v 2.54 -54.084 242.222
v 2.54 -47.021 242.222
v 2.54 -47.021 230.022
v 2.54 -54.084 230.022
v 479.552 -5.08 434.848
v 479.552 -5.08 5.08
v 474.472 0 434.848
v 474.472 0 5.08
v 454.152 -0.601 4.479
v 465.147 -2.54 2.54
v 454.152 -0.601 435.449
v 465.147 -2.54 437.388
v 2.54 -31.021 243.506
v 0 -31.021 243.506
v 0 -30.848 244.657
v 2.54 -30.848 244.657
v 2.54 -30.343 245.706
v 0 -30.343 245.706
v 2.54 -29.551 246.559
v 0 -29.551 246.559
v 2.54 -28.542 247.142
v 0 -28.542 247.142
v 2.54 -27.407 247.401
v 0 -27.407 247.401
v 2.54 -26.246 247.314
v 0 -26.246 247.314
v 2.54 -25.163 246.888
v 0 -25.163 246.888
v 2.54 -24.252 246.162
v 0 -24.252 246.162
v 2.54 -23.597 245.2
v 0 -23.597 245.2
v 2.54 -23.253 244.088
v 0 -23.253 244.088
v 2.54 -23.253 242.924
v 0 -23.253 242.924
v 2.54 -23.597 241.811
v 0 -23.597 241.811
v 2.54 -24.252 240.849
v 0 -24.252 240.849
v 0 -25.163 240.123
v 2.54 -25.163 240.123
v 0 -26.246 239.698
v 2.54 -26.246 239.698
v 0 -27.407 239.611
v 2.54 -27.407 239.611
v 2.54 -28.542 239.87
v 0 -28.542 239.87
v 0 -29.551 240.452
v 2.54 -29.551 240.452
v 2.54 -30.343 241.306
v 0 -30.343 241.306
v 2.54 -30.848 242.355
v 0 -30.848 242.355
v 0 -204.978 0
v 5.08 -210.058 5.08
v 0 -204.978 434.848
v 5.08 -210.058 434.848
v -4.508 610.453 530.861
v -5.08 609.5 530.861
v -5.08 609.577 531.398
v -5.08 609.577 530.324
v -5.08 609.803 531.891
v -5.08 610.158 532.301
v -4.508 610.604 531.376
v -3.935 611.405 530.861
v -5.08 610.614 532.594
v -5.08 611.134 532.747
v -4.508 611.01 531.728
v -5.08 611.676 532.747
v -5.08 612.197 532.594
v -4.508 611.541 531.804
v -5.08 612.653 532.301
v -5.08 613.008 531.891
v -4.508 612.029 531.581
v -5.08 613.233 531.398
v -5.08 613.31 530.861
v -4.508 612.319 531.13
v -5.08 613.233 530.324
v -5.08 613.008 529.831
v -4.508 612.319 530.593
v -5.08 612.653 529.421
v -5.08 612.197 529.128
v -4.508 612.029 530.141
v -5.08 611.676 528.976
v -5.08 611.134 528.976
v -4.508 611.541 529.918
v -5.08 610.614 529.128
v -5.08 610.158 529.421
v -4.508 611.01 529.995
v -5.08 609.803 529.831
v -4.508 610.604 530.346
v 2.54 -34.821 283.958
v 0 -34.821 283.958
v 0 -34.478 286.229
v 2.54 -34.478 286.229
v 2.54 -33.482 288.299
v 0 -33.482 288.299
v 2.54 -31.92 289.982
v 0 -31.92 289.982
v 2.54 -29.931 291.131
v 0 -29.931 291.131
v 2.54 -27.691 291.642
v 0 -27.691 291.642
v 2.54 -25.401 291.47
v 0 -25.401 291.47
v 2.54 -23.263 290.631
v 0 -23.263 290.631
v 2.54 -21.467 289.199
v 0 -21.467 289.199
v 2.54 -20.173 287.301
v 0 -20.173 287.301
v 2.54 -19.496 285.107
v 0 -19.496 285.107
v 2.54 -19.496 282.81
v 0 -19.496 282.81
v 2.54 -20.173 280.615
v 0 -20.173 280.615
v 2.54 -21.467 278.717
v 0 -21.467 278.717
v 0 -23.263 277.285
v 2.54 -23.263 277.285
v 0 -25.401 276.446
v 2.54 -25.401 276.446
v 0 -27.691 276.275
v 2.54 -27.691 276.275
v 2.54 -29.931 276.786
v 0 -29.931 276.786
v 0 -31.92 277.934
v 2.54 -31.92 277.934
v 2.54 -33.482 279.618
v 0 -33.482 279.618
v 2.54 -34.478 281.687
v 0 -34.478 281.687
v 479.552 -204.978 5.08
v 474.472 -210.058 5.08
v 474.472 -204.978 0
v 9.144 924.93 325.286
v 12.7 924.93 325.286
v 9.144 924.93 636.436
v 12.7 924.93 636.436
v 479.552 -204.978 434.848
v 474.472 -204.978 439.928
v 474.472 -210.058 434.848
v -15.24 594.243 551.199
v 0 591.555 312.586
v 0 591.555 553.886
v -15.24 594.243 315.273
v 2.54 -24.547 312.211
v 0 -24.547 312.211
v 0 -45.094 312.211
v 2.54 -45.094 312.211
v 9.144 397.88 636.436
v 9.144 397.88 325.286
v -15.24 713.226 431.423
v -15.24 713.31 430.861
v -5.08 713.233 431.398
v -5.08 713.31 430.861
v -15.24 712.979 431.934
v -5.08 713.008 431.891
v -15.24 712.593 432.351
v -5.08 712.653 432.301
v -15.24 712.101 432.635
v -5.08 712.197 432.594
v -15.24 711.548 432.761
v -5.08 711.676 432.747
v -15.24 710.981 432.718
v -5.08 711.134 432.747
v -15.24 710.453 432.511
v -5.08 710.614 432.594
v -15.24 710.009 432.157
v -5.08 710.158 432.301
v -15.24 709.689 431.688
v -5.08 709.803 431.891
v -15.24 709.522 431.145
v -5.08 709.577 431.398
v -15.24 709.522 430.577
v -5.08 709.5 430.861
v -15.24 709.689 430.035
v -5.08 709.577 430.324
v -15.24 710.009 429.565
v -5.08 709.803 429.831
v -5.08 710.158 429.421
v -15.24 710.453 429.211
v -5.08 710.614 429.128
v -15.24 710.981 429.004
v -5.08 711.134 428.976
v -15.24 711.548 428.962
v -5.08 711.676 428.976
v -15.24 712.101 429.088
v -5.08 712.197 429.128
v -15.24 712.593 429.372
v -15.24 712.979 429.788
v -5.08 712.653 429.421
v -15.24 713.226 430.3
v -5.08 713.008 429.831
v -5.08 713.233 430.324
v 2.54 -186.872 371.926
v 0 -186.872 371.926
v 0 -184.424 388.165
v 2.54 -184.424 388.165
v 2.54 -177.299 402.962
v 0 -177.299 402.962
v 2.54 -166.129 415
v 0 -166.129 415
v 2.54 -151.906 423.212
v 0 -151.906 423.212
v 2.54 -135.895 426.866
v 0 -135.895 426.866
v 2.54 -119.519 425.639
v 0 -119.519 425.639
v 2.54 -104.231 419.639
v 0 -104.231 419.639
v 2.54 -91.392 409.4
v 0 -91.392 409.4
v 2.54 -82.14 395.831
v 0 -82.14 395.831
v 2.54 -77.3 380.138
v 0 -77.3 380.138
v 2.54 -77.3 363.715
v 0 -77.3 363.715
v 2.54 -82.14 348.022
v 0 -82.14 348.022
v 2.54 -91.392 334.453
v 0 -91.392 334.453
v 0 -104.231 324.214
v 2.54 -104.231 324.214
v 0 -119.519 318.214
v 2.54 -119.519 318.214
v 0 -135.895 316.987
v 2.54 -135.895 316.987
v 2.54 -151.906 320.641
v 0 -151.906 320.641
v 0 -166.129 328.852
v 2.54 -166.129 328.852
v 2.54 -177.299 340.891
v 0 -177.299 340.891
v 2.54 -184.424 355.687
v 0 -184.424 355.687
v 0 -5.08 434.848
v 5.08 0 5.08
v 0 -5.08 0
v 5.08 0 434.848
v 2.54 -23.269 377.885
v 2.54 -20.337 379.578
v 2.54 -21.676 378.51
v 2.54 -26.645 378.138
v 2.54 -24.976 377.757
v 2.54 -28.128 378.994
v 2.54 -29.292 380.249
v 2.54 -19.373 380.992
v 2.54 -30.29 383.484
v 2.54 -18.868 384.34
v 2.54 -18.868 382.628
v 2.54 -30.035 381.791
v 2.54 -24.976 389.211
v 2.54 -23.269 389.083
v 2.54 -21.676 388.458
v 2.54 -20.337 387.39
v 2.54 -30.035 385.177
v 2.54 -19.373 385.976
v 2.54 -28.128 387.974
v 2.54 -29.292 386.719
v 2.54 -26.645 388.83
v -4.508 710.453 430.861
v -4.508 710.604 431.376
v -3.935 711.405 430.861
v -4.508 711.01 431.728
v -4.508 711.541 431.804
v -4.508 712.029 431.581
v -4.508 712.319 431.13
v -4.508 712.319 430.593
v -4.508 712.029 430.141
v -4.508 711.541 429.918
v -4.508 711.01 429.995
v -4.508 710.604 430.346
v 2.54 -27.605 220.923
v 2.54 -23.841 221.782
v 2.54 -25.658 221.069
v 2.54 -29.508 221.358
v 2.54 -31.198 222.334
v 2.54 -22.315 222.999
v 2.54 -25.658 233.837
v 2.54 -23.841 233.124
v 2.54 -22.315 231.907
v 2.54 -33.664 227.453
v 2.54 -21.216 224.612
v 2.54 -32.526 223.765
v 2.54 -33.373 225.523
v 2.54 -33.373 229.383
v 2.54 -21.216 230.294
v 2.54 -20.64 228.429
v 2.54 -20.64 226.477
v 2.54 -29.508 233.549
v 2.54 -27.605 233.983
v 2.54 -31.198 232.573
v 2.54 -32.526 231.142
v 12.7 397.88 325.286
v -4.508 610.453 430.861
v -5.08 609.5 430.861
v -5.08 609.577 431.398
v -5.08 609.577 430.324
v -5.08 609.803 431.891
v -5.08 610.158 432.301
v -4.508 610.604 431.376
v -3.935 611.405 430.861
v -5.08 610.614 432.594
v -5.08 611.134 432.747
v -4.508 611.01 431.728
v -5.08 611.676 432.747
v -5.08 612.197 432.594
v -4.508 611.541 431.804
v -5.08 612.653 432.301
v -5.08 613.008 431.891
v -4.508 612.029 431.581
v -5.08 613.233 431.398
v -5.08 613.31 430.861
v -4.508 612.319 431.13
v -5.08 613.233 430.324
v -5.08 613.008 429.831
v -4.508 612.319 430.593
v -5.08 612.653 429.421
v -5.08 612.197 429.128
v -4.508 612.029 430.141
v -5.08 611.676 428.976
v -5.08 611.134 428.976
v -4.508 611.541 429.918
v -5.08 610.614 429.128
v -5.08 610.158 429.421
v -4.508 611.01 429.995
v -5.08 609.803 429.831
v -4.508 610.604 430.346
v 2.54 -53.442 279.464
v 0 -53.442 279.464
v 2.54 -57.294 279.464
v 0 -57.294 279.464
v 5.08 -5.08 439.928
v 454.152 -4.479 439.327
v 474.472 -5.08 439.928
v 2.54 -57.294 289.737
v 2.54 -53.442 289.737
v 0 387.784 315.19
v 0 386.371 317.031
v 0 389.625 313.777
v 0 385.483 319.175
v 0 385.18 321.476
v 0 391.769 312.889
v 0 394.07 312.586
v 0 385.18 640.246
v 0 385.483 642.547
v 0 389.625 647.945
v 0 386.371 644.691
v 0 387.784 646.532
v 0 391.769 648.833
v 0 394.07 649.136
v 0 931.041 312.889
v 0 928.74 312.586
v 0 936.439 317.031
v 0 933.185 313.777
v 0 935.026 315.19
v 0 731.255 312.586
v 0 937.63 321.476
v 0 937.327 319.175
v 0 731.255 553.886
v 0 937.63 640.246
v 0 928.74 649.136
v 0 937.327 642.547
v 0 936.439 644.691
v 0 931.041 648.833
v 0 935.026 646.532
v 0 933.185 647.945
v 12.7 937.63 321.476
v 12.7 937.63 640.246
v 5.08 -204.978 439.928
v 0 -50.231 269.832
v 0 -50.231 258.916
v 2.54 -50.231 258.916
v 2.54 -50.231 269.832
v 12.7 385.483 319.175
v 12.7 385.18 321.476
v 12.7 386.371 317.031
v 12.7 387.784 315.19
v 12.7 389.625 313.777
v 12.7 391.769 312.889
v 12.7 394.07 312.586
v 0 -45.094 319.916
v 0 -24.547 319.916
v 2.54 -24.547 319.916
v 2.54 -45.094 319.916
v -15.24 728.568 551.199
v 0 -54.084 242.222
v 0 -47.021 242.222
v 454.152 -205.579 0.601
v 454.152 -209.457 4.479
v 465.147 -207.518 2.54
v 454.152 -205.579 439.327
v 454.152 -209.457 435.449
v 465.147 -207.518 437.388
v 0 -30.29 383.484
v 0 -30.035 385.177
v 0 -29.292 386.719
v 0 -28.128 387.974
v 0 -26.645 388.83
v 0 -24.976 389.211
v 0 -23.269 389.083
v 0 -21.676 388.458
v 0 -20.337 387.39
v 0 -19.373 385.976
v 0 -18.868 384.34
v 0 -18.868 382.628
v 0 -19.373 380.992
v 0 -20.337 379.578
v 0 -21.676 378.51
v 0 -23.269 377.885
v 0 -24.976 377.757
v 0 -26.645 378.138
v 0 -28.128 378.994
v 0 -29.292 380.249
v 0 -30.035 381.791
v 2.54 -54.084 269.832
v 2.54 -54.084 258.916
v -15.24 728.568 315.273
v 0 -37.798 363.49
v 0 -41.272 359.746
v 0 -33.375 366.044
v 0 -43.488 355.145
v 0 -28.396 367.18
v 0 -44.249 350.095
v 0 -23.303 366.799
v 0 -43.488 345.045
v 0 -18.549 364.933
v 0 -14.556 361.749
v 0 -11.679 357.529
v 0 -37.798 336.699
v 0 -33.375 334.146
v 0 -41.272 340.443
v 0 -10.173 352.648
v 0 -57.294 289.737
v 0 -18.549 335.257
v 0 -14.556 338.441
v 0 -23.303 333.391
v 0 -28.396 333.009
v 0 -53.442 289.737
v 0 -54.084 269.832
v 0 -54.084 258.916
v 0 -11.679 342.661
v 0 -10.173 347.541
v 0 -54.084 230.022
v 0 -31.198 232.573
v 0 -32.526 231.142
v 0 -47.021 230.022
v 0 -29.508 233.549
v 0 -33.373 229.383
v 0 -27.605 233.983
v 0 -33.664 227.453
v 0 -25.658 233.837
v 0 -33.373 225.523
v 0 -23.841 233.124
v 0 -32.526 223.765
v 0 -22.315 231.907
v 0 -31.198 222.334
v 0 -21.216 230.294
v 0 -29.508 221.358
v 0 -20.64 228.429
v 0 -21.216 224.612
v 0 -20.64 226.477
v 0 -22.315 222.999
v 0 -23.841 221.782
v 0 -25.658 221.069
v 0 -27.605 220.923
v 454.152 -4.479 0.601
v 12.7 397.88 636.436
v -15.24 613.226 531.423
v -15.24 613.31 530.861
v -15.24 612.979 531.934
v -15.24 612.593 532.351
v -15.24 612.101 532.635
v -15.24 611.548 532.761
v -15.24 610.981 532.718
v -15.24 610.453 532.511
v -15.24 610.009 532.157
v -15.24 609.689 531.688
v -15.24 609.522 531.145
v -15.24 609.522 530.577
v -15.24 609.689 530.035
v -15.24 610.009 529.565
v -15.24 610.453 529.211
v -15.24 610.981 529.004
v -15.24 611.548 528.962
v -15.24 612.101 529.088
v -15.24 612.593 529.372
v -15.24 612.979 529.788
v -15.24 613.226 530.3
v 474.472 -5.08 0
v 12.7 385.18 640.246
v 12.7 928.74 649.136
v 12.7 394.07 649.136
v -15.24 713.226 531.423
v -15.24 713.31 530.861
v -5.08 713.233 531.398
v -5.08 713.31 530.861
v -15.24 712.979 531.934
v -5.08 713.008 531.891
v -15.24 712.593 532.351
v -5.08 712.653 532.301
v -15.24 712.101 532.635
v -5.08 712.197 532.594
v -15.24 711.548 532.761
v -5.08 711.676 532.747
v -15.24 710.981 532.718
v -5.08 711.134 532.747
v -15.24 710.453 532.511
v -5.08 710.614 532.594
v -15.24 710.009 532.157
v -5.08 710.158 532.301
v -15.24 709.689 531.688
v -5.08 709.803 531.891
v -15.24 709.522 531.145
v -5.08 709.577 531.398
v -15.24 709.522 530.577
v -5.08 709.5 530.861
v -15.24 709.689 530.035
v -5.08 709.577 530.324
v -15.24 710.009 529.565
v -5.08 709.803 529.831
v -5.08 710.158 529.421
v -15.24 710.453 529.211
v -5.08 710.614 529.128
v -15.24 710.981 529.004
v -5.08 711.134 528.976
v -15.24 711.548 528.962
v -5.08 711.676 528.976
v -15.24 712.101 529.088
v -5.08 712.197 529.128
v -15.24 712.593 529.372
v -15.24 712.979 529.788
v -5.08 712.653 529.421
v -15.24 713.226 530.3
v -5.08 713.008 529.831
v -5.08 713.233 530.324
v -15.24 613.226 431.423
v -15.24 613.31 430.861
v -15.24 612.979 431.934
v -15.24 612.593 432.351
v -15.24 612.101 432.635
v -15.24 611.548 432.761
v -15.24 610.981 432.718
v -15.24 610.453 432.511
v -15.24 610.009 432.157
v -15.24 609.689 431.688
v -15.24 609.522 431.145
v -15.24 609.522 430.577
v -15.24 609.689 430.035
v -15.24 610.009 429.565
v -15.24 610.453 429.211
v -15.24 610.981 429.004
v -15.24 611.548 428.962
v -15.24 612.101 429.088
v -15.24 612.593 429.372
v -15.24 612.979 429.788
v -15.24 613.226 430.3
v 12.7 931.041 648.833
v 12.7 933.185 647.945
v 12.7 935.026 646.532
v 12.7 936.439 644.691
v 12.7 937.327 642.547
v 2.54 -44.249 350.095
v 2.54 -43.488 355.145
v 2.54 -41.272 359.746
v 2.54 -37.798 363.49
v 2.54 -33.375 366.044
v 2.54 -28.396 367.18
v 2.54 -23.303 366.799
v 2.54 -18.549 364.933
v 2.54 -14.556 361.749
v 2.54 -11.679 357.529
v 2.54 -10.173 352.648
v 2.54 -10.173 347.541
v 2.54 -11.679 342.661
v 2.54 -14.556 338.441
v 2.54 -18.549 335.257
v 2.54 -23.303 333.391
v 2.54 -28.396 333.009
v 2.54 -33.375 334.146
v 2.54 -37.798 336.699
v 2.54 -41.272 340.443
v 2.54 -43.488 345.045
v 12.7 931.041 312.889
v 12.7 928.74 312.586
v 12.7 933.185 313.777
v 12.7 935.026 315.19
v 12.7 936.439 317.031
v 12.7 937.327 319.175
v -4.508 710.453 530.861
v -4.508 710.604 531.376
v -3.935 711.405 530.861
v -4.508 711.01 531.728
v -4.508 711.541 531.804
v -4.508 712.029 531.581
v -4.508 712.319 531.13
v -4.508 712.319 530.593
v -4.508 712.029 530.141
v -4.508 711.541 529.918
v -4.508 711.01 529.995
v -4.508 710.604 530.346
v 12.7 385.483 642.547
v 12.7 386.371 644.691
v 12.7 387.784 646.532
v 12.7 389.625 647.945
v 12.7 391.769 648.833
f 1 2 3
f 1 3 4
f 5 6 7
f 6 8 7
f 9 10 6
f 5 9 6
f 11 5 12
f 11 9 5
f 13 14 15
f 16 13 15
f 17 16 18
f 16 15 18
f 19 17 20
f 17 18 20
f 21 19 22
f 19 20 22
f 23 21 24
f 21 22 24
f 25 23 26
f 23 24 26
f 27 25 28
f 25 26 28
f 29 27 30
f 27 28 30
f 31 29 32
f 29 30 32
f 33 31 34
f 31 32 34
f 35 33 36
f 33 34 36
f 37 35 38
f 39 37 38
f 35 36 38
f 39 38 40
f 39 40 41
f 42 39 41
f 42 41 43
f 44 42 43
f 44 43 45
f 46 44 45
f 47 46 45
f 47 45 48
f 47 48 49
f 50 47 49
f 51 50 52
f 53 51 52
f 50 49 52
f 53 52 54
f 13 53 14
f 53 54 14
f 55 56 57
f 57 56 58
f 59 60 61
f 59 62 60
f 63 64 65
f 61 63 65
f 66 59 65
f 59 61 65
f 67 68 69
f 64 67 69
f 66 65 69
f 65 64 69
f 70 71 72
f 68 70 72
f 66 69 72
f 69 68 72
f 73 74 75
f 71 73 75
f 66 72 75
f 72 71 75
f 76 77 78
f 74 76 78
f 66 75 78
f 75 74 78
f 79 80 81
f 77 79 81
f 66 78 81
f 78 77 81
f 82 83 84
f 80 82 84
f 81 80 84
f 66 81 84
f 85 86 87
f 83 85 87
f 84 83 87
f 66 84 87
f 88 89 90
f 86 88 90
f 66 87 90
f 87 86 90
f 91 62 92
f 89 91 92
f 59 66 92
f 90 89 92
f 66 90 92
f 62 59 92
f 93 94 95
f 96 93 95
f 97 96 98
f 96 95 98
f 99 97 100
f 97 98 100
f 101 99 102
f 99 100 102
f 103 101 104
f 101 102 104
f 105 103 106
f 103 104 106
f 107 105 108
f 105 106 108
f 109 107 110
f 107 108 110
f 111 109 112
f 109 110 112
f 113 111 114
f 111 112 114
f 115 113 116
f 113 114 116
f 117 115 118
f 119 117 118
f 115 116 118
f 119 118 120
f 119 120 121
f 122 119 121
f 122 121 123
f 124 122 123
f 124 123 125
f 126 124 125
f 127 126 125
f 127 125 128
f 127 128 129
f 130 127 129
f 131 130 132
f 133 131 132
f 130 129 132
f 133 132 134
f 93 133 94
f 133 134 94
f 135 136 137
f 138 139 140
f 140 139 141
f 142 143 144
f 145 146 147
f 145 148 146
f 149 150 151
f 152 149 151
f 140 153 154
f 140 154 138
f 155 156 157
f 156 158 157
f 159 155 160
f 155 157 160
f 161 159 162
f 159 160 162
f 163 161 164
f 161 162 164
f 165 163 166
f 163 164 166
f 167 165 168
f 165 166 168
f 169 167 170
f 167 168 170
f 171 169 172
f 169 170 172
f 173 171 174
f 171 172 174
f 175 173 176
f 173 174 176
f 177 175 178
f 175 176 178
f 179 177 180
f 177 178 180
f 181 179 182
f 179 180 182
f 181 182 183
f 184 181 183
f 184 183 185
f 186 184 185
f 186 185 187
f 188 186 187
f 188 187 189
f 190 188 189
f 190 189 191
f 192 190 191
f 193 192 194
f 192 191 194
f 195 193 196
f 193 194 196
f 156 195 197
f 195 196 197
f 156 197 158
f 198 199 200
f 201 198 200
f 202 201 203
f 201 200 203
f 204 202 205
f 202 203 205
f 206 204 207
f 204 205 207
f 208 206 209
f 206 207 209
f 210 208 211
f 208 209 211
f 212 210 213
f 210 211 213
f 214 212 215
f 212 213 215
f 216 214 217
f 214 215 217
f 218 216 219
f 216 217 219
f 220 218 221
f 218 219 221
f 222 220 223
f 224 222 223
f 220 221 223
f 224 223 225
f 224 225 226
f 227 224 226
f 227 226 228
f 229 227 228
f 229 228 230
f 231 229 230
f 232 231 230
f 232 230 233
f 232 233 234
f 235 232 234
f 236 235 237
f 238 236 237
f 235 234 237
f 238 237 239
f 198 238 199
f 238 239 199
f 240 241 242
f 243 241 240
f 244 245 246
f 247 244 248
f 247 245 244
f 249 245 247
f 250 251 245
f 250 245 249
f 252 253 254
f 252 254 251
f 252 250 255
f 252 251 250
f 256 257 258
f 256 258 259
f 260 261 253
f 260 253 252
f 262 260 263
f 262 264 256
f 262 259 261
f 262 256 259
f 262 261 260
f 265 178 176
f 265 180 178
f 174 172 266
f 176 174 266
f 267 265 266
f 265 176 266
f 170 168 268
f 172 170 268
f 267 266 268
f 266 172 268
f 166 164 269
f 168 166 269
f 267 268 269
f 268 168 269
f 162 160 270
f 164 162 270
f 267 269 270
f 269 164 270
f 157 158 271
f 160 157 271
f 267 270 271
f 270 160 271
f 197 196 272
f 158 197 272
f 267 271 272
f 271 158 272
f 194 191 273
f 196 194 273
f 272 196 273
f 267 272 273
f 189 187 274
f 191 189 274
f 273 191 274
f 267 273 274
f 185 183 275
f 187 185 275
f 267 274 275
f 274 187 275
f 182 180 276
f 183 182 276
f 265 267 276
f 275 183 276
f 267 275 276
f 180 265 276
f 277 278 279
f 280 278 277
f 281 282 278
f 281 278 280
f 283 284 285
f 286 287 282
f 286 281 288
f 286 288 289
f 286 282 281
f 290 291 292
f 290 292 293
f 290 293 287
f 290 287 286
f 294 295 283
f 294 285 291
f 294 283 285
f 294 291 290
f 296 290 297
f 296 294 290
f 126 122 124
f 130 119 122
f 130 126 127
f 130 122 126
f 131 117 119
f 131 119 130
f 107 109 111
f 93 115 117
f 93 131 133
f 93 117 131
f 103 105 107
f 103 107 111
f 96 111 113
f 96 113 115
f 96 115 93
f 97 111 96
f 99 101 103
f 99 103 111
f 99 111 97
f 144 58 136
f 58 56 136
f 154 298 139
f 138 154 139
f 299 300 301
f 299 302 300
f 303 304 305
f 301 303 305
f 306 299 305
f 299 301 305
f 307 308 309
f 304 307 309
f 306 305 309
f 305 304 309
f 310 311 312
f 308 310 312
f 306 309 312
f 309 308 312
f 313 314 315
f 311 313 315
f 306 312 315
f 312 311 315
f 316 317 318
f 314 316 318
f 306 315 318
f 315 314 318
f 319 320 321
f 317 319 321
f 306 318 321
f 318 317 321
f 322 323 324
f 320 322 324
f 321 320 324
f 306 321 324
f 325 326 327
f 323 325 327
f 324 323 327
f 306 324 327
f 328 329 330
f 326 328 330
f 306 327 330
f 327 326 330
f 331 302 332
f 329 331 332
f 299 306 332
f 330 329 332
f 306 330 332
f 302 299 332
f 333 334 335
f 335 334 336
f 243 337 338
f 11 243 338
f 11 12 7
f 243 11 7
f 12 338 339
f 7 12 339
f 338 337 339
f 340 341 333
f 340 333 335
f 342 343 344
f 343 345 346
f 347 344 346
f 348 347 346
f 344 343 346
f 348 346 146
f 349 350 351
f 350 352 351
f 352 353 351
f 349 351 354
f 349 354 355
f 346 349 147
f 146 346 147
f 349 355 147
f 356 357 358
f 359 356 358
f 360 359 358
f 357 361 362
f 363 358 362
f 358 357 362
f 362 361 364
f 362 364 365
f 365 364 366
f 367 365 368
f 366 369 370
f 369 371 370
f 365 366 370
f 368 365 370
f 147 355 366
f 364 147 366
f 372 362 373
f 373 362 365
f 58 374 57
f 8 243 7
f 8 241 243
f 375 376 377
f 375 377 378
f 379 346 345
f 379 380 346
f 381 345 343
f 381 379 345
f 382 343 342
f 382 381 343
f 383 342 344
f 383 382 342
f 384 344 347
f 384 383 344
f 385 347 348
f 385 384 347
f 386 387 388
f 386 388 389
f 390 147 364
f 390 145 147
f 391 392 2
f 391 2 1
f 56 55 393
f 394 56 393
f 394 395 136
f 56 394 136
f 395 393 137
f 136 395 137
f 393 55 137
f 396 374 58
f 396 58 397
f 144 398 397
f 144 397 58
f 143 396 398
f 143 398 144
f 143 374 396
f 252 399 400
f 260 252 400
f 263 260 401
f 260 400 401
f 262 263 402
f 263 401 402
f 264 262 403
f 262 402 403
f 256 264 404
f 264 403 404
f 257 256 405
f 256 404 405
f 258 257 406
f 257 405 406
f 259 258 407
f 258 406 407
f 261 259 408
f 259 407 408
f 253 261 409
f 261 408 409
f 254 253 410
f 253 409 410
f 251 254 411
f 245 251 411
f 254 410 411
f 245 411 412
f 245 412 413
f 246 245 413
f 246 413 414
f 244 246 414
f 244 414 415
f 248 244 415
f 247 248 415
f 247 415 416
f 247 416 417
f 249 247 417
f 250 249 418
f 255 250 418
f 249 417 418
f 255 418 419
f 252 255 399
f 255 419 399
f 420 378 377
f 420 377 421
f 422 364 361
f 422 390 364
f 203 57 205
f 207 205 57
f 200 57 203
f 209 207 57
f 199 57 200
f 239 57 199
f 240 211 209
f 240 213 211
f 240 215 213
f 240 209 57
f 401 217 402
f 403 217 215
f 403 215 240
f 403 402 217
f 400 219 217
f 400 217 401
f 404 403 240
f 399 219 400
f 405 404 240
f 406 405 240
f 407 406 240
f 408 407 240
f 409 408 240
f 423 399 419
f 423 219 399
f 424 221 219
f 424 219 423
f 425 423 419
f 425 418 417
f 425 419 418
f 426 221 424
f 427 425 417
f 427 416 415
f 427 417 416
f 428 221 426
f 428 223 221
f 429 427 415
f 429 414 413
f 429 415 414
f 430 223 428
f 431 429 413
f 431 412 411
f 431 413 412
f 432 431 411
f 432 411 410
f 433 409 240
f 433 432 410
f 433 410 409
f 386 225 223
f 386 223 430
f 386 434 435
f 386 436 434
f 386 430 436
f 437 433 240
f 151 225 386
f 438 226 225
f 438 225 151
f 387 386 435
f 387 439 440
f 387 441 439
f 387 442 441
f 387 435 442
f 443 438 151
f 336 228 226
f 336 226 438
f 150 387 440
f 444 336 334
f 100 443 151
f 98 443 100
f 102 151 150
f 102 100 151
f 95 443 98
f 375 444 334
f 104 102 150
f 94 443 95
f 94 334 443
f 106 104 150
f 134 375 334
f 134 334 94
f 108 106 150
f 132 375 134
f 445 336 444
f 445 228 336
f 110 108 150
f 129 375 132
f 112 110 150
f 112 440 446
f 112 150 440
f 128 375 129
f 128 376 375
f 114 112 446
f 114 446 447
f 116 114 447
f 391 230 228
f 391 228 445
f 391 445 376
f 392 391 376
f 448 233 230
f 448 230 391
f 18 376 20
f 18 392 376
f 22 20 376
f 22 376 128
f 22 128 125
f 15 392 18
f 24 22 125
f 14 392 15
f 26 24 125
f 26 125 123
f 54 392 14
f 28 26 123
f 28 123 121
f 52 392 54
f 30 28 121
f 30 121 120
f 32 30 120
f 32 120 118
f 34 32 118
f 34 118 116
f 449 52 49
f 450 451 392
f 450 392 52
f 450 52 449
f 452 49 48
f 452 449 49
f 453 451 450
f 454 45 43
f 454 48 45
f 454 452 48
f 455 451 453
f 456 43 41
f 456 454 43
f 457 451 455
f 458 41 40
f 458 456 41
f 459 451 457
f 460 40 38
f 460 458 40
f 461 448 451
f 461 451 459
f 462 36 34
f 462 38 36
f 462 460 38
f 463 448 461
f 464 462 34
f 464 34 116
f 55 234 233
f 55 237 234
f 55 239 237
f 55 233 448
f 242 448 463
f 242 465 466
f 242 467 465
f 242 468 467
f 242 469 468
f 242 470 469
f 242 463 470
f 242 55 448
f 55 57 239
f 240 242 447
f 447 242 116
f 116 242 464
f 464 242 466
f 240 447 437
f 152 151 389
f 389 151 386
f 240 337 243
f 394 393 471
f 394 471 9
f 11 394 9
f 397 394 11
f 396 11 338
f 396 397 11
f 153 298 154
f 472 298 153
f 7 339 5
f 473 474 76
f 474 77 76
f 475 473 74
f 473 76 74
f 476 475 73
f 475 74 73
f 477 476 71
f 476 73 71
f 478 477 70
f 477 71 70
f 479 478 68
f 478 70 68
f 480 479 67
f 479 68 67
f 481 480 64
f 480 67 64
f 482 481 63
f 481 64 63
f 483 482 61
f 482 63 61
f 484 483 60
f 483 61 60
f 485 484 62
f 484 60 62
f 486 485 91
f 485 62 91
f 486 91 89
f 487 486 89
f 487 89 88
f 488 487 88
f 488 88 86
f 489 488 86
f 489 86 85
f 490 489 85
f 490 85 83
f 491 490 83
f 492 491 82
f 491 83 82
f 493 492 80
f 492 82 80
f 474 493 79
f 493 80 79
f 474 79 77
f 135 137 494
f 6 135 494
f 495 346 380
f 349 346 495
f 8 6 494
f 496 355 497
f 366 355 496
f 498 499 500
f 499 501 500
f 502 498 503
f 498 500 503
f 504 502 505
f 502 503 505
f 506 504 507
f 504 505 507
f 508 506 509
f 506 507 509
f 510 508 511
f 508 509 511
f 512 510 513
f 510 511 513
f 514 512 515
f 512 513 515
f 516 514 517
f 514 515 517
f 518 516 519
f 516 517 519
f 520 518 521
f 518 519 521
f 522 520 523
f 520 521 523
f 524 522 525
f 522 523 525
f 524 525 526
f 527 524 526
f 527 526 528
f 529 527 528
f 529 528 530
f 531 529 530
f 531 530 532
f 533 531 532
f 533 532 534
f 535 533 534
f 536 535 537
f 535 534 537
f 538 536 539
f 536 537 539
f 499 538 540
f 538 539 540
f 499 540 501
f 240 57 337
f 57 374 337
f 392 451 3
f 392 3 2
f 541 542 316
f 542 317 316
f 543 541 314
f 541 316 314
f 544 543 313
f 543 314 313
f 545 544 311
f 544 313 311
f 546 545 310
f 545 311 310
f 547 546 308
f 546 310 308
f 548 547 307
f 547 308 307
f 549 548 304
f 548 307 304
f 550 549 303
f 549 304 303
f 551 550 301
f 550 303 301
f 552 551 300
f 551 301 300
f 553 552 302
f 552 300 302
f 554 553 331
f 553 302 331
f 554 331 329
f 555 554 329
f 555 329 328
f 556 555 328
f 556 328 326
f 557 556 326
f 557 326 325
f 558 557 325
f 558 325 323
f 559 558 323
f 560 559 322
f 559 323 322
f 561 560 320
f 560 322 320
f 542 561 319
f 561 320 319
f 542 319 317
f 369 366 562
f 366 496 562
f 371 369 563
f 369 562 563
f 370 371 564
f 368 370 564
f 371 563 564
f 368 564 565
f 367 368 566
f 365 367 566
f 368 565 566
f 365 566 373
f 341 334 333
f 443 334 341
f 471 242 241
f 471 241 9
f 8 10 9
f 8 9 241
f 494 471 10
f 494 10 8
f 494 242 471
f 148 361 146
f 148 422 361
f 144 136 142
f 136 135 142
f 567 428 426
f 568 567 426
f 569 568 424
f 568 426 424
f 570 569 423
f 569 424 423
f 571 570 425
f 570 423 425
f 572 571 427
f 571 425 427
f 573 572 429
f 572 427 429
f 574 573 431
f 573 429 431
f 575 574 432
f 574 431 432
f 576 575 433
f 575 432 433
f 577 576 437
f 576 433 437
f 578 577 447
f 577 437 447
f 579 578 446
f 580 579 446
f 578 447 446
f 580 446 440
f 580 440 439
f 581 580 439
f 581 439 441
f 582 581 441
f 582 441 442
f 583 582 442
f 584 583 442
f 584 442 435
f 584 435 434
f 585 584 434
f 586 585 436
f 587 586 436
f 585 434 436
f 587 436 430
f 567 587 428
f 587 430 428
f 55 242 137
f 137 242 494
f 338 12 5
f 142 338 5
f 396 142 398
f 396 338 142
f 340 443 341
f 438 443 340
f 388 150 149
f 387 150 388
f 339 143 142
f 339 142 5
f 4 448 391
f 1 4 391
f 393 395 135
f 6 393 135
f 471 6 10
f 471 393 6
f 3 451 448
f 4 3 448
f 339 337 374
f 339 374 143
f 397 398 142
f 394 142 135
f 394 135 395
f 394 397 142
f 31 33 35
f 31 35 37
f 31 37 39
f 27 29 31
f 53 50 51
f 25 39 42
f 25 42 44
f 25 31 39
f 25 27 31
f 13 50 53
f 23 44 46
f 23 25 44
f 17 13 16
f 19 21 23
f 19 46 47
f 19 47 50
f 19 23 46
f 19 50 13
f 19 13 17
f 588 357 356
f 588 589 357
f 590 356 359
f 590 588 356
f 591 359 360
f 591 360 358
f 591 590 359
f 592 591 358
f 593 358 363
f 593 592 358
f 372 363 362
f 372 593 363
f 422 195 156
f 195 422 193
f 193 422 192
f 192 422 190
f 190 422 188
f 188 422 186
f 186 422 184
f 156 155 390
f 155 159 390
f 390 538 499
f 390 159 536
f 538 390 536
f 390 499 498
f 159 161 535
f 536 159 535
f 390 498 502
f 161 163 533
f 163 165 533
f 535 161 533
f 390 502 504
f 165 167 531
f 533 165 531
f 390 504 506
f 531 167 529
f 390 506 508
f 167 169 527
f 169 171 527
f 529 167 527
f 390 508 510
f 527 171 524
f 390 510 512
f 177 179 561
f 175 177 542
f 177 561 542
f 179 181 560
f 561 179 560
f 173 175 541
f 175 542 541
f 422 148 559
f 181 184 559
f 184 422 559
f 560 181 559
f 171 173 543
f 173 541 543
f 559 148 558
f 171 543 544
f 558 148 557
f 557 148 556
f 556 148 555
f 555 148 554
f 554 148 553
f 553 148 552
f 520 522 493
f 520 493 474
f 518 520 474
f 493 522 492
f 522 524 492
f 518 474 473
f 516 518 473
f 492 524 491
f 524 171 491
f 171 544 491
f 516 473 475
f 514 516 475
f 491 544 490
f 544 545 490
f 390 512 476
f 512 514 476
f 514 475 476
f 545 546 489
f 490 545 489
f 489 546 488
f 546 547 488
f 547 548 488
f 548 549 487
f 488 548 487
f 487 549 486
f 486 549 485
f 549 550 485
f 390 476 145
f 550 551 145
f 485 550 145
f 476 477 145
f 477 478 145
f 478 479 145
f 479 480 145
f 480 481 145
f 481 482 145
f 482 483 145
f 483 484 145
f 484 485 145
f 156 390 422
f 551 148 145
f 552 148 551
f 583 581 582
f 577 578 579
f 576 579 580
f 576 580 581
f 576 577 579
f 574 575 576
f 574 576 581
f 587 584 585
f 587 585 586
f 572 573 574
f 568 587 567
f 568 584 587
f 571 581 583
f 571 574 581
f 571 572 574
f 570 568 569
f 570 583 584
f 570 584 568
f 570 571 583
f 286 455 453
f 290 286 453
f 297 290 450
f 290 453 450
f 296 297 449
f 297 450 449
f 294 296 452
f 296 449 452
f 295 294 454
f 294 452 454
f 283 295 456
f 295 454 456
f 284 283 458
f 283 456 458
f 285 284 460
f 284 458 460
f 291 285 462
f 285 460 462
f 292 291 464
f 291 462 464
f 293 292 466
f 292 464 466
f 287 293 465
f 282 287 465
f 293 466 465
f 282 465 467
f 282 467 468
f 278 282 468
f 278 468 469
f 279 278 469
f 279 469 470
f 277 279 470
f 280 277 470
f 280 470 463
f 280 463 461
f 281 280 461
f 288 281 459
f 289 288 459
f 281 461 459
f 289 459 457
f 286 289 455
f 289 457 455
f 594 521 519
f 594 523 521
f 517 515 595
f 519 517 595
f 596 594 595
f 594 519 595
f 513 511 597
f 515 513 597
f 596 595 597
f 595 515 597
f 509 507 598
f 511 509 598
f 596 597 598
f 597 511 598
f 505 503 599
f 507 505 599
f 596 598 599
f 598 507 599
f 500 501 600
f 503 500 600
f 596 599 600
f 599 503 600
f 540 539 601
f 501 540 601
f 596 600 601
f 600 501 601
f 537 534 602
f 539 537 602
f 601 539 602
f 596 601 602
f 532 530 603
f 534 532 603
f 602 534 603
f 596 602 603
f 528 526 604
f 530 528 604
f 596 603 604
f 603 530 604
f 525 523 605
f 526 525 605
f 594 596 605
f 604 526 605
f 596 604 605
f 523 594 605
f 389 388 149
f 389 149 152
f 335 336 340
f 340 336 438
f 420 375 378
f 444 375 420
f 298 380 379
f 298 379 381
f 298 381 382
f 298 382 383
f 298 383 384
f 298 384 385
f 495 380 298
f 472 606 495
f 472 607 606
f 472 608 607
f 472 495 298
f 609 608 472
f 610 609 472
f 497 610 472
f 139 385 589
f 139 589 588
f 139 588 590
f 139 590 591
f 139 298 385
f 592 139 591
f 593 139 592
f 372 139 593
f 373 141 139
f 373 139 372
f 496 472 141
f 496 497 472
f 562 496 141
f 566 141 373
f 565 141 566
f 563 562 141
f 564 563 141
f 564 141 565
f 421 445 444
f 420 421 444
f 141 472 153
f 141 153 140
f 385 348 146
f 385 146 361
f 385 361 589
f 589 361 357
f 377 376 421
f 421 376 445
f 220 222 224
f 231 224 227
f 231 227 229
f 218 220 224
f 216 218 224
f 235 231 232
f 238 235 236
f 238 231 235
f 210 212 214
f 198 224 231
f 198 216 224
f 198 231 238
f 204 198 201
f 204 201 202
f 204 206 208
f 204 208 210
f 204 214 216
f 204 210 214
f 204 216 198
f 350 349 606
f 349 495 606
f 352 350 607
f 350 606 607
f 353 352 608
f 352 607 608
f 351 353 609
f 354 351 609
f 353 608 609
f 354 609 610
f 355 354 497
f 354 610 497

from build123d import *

# Parameters (mm, degrees)
F0_W       = 479.552
F0_H       = 210.058
F1_DEPTH   = 439.928
F2_SIZE    = 5.08
F3_R       = 5.7431434396
F3_R_2     = 17.1334316856
F3_R_3     = 7.7052414417
F3_R_4     = 3.9057479248
F3_R_5     = 6.5481874327
F3_W       = 20.5472745001
F3_H       = 7.7052414417
F3_W_2     = 3.852609545
F3_H_2     = 10.2736353874
F3_W_3     = 3.8526132703
F3_H_3     = 10.9157264233
F3_W_4     = 7.0631280541
F3_H_4     = 12.1999531984
F3_R_6     = 55.0937295808
F4_DEPTH   = 2.54
F1_FACE1_W = 199.898
F1_FACE1_H = 429.768
F5_DEPTH   = 25.4
F5_TAPER   = -10
F6_W       = 552.45
F6_H       = 336.55
F7_DEPTH   = 12.7
F8_W       = 139.7
F8_H       = 241.3
F9_DEPTH   = 15.24
F9_TAPER   = 10
F10_W      = 527.05
F10_H      = 311.15
F11_DEPTH  = 3.556
F12_R      = 8.89
F14_D      = 3.81
F14_DEPTH  = 10.16
F14_TIP    = 1.1446394792


with BuildPart() as f1:
    # F0 (on Top) → F1 (new body)
    with BuildSketch(Plane.XY):
        with Locations((239.776, -105.029)):
            Rectangle(F0_W, F0_H)
    extrude(amount=F1_DEPTH)

    # F2
    f2_edges = [f1.edges().sort_by_distance(p)[0] for p in [
        (239.776, 0, 439.928),
        (0, -105.029, 439.928),
        (239.776, -210.058, 439.928),
        (479.552, -105.029, 439.928),
        (0, -210.058, 219.964),
        (479.552, -210.058, 219.964),
        (239.776, -210.058, 0),
        (479.552, 0, 219.964),
        (479.552, -105.029, 0),
        (0, 0, 219.964),
        (239.776, 0, 0),
    ]]
    chamfer(f2_edges, length=F2_SIZE)

    # F3 (on face) → F4 (cut)
    with BuildSketch(Plane(origin=(0, 0, 0), x_dir=(0, -1, 0), z_dir=(-1, 0, 0))):
        with Locations((24.5471298695, 383.4841549397)):
            Circle(F3_R)
        with Locations((27.1155368537, 350.0948250294)):
            Circle(F3_R_2)
        with Locations((27.1155368537, 283.958286047)):
            Circle(F3_R_3)
        with Locations((27.1155368537, 243.505820632)):
            Circle(F3_R_4)
        with Locations((27.1155368537, 227.4532616138)):
            Circle(F3_R_5)
        with Locations((34.8207671195, 316.0633891821)):
            Rectangle(F3_W, F3_H)
        with Locations((55.3680416197, 284.6003770828)):
            Rectangle(F3_W_2, F3_H_2)
        with Locations((52.1575324237, 264.3741518259)):
            Rectangle(F3_W_3, F3_H_3)
        with Locations((50.5522750318, 236.1216470599)):
            Rectangle(F3_W_4, F3_H_4)
        with Locations((131.7782253027, 371.9263076782)):
            Circle(F3_R_6)
    extrude(amount=-F4_DEPTH, mode=Mode.SUBTRACT)

    # F1_face1 (on face) → F5 (cut)
    with BuildSketch(Plane(origin=(479.552, -105.029, 219.964), x_dir=(0, 1, 0), z_dir=(1, 0, 0))):
        Rectangle(F1_FACE1_W, F1_FACE1_H)
    extrude(amount=-F5_DEPTH, taper=F5_TAPER, mode=Mode.SUBTRACT)


with BuildPart() as f7:
    # F6 (on Right) → F7 (new body)
    with BuildSketch(Plane.YZ):
        with Locations((661.4052802324, 480.8611900917)):
            Rectangle(F6_W, F6_H)
    extrude(amount=F7_DEPTH)

    # F8 (on face) → F9 (join)
    with BuildSketch(Plane(origin=(0, 0, 0), x_dir=(0, -1, 0), z_dir=(-1, 0, 0))):
        with Locations((-661.4052802324, 433.2361900917)):
            Rectangle(F8_W, F8_H)
    extrude(amount=F9_DEPTH, taper=F9_TAPER)

    # F10 (on face) → F11 (cut)
    with BuildSketch(Plane.YZ.offset(12.7)):
        with Locations((661.4052802324, 480.8611900917)):
            Rectangle(F10_W, F10_H)
    extrude(amount=-F11_DEPTH, mode=Mode.SUBTRACT)

    # F12
    f12_edges = [f7.edges().sort_by_distance(p)[0] for p in [
        (6.35, 385.18028, 649.13619),
        (6.35, 937.63028, 649.13619),
        (6.35, 937.63028, 312.58619),
        (6.35, 385.18028, 312.58619),
    ]]
    fillet(f12_edges, radius=F12_R)

    # F14
    with Locations(Plane(origin=(-15.24, 0, 0), x_dir=(0, -1, 0), z_dir=(-1, 0, 0))):
        with Locations((-711.4052802324, 530.8611900917), (-711.4052802324, 430.8611900917), (-611.4052802324, 430.8611900917), (-611.4052802324, 530.8611900917)):
            Hole(F14_D / 2, depth=F14_DEPTH)
            with Locations((0, 0, -(F14_DEPTH + F14_TIP / 2))):  # 118° drill point
                Cone(0, F14_D / 2, F14_TIP, mode=Mode.SUBTRACT)


solid = Compound([f1.part, f7.part])
